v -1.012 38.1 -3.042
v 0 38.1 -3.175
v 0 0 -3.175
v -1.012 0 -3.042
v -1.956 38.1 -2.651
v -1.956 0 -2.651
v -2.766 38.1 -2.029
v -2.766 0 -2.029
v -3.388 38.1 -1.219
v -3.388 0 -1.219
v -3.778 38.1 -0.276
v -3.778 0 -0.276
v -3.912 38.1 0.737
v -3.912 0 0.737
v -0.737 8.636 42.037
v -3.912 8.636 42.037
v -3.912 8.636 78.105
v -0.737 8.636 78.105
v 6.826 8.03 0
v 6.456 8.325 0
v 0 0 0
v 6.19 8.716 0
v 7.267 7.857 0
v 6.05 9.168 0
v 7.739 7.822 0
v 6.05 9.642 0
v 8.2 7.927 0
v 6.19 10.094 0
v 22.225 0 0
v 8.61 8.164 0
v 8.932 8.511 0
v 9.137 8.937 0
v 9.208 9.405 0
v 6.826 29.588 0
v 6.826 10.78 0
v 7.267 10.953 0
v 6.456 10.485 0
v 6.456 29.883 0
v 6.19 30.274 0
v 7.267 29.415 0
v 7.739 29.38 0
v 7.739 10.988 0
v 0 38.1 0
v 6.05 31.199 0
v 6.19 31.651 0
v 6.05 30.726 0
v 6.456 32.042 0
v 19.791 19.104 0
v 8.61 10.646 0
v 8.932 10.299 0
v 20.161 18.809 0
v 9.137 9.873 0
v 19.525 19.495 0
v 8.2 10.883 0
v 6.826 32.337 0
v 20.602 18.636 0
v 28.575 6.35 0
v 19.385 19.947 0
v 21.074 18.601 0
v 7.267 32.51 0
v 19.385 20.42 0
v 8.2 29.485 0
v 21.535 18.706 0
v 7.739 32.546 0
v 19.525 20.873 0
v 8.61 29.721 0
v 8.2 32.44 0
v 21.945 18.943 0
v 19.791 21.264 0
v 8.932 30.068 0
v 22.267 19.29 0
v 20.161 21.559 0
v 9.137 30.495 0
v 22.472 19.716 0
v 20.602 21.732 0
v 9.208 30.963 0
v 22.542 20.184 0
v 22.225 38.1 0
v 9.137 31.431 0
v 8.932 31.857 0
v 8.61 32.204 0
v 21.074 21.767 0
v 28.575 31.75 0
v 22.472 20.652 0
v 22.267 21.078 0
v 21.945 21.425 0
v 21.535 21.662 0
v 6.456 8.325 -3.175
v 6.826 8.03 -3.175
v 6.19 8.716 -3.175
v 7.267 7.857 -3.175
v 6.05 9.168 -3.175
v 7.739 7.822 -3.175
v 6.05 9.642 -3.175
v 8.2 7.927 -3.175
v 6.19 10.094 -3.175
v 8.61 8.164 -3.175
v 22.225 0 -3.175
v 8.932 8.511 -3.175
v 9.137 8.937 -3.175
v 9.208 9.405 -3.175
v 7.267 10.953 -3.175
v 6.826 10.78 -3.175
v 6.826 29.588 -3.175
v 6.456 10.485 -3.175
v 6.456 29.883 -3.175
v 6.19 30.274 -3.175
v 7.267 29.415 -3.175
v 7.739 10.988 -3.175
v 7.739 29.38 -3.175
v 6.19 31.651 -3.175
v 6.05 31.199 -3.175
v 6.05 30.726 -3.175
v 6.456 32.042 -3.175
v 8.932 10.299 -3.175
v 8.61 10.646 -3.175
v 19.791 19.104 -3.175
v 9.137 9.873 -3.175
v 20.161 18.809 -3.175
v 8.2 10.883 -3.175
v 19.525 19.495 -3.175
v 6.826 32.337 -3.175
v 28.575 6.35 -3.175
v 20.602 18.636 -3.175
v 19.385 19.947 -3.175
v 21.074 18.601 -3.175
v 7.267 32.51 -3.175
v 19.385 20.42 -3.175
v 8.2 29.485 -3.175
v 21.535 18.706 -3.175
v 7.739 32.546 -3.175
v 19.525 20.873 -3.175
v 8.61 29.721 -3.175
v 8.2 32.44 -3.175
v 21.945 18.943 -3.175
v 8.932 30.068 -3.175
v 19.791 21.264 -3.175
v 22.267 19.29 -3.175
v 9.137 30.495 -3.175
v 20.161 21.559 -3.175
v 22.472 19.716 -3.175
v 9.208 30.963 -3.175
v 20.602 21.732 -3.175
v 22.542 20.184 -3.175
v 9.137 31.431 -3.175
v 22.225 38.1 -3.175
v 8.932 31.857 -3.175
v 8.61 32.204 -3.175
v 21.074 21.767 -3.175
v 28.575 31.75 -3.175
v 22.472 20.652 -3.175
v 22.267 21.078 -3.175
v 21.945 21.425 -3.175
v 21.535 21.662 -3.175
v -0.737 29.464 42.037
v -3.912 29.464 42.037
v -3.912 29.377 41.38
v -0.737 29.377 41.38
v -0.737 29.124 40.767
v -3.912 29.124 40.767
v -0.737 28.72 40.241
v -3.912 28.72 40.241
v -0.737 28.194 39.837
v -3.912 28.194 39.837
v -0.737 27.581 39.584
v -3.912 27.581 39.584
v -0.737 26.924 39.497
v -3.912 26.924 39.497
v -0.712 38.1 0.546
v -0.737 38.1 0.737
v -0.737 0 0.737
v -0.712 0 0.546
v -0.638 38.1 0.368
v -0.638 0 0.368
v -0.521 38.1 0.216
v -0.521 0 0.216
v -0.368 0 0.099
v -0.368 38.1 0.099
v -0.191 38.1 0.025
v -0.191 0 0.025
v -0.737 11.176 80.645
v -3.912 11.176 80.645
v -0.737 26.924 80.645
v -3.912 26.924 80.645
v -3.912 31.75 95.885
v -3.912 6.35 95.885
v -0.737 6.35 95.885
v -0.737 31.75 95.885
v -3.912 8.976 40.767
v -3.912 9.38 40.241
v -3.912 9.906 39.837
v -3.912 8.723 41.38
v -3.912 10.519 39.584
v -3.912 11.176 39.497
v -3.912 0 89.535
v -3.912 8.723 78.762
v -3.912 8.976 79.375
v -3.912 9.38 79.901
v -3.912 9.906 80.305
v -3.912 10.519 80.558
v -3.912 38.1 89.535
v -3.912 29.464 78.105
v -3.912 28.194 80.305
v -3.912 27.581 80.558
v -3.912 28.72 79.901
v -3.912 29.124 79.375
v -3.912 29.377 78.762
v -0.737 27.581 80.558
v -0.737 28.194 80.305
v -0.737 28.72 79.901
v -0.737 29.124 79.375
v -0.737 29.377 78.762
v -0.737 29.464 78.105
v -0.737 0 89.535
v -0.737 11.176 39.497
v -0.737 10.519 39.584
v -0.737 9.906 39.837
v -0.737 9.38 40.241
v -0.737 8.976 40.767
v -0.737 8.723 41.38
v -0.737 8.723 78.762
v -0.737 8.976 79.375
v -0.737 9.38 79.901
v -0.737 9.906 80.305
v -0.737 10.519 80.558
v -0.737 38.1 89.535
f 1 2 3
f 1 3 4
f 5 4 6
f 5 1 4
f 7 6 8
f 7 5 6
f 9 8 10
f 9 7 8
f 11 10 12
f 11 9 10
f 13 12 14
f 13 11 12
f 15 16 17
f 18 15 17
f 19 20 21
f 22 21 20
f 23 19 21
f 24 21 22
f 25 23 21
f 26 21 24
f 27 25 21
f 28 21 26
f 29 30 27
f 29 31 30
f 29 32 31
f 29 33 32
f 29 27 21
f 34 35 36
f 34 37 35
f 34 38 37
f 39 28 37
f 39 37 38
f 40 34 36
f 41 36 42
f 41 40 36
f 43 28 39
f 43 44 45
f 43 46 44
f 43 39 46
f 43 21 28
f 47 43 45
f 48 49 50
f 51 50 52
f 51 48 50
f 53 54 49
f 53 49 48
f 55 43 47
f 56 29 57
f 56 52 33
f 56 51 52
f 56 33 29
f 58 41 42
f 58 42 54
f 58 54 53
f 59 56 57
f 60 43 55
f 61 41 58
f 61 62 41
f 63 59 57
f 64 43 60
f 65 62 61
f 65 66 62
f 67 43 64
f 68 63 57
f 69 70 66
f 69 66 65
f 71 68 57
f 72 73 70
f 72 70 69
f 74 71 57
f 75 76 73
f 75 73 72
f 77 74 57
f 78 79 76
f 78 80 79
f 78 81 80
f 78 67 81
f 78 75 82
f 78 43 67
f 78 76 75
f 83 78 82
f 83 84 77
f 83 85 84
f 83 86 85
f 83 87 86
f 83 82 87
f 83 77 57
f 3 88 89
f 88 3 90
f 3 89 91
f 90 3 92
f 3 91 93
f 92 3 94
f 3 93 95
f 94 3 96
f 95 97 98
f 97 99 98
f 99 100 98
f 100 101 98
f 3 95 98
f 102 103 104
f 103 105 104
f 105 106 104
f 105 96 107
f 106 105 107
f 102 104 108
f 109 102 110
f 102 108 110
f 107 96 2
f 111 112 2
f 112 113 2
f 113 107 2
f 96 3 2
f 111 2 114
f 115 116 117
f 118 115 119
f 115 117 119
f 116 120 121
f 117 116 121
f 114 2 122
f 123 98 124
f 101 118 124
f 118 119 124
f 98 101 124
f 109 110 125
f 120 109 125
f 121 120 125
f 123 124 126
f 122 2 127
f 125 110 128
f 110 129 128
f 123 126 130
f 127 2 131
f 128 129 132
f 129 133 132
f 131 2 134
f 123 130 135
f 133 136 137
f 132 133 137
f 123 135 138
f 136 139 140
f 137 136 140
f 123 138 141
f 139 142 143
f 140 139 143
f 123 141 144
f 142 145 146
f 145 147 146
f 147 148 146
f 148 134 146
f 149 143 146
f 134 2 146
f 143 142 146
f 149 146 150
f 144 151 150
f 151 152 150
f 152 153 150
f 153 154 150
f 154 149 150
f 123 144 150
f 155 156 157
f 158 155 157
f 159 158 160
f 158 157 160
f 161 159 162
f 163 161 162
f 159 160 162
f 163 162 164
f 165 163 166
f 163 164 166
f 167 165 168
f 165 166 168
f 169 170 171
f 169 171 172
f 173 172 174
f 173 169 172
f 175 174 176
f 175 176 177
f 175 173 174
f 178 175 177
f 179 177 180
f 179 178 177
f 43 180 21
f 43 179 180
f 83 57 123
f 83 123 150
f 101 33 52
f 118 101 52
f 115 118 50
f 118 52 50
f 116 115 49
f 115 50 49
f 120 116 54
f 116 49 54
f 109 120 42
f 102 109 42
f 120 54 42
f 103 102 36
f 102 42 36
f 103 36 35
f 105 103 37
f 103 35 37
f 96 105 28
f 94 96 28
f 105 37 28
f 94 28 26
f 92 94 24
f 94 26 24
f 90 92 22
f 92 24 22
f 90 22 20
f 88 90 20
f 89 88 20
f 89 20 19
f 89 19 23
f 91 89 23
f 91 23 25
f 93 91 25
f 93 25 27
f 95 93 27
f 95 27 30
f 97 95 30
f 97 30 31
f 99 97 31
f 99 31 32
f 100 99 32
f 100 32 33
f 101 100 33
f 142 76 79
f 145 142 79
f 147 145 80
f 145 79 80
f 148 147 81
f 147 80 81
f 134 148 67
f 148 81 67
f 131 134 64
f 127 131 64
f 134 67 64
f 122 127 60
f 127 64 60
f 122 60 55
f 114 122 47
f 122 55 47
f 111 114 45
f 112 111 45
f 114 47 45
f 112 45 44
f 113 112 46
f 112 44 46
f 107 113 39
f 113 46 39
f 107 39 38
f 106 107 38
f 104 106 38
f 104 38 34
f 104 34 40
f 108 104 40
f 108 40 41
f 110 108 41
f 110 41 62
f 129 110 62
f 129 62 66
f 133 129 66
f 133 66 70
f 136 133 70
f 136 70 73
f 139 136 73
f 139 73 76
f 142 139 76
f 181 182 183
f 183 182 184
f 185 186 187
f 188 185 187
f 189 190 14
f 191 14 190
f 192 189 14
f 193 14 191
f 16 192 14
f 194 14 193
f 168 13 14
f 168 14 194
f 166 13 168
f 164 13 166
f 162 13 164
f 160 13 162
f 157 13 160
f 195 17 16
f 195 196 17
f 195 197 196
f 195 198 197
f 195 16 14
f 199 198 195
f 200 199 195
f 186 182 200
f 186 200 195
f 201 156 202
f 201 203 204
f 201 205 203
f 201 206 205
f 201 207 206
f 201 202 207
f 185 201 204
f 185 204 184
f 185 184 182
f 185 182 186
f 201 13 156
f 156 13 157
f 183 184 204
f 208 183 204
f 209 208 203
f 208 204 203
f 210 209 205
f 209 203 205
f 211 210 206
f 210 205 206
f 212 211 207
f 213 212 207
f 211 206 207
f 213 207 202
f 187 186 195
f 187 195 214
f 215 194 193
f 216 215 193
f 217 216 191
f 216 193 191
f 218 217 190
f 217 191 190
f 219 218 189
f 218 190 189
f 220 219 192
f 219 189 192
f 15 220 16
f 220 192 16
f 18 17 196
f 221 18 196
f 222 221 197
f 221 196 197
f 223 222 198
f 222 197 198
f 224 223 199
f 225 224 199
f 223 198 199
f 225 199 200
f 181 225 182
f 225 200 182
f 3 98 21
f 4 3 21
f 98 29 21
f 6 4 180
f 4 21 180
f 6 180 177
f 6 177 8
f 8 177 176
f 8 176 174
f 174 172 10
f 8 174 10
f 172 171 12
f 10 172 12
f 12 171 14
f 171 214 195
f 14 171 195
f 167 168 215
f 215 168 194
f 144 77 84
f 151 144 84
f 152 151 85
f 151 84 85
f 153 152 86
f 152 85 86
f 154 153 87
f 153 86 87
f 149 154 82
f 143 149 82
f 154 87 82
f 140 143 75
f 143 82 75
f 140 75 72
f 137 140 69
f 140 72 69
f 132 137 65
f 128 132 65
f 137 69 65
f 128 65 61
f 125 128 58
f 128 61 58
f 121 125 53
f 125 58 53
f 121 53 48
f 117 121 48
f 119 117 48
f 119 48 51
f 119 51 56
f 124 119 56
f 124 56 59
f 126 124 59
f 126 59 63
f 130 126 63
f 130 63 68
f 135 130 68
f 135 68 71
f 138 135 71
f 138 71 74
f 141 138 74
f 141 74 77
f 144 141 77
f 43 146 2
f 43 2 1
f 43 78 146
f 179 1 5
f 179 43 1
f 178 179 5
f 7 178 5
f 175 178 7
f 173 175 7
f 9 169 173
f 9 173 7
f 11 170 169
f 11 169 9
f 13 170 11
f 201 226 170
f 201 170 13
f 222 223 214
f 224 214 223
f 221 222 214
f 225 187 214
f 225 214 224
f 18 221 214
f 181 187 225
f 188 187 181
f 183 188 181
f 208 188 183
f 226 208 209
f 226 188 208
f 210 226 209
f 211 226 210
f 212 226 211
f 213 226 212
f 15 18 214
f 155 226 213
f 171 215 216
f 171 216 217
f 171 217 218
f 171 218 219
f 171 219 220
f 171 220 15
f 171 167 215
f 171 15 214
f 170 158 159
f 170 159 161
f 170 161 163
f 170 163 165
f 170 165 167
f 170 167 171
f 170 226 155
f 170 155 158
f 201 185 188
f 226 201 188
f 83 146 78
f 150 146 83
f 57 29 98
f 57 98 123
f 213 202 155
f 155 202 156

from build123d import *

# Parameters (mm, degrees)
SKETCH1_W                 = 28.575
SKETCH1_H                 = 38.1
BASE_FLANGE1_DEPTH        = 3.175
EDGE_FLANGE1_DEPTH        = 38.1
BREAK_CORNER1_START       = 42.656216575
BREAK_CORNER1_OUTLINE_W   = 32
BREAK_CORNER1_OUTLINE_H   = 6
BREAK_CORNER1_DEPTH       = 4.490128061
BREAK_CORNER1_START_2     = 15.715448212
BREAK_CORNER1_2_OUTLINE_W = 32
BREAK_CORNER1_2_OUTLINE_H = 6
BREAK_CORNER1_2_DEPTH     = 4.49012806
BREAK_CORNER1_START_3     = 90.251574017
BREAK_CORNER1_3_OUTLINE_W = 6
BREAK_CORNER1_3_OUTLINE_H = 32
BREAK_CORNER1_3_DEPTH     = 4.49012806
BREAK_CORNER1_START_4     = -67.800933714
BREAK_CORNER1_4_OUTLINE_W = 6
BREAK_CORNER1_4_OUTLINE_H = 31
BREAK_CORNER1_4_DEPTH     = 4.49012806
CUT_EXTRUDE1_REACH        = 110.171
CUT_EXTRUDE2_REACH        = 109.061
SKETCH10_R                = 1.5875


# Read off the part's stored shape, not the designer's step: Break-Corner1
# Sheet-metal steps are written as plain solids
with BuildPart() as part:
    # Sketch1 → Base-Flange1 (new body)
    with BuildSketch(Plane.XY):
        with Locations((14.2875, 19.05)):
            Rectangle(SKETCH1_W, SKETCH1_H)
    extrude(amount=-BASE_FLANGE1_DEPTH)

    # Edge-Flange1 section (across the edge) → Edge-Flange1 (add)
    with BuildSketch(Plane(origin=(-0.7366, 38.1, 0), x_dir=(1, 0, 0), z_dir=(0, -1, 0))):
        with BuildLine():
            Line((-3.175, 0.7366), (-3.175, 95.885))
            Line((-3.175, 95.885), (0, 95.885))
            Line((0, 95.885), (0, 0.7366))
            ThreePointArc((0, 0.7366), (0.215745145, 0.215745145), (0.7366, 0))
            Line((0.7366, 0), (0.7366, -3.175))
            ThreePointArc((0.7366, -3.175), (-2.029318885, -2.029318885), (-3.175, 0.7366))
        make_face()
    extrude(amount=EDGE_FLANGE1_DEPTH)

    # Break-Corner1 outline → Break-Corner1 (cut)
    with BuildSketch(Plane(origin=(0, 0, 0), x_dir=(0.707106781186548, -0.707106781186547, 0), z_dir=(0.707106781186547, 0.707106781186548, 0)).offset(BREAK_CORNER1_START)):
        with Locations((3, 2)):
            Rectangle(BREAK_CORNER1_OUTLINE_W, BREAK_CORNER1_OUTLINE_H)
    extrude(amount=BREAK_CORNER1_DEPTH, mode=Mode.SUBTRACT)

    # Break-Corner1 2 outline → Break-Corner1 2 (cut)
    with BuildSketch(Plane(origin=(0, 0, 0), x_dir=(0.707106781186548, 0.707106781186547, 0), z_dir=(0.707106781186547, -0.707106781186548, 0)).offset(BREAK_CORNER1_START_2)):
        with Locations((30, -2)):
            Rectangle(BREAK_CORNER1_2_OUTLINE_W, BREAK_CORNER1_2_OUTLINE_H)
    extrude(amount=BREAK_CORNER1_2_DEPTH, mode=Mode.SUBTRACT)

    # Break-Corner1 3 outline → Break-Corner1 3 (cut)
    with BuildSketch(Plane(origin=(0, 0, 0), x_dir=(1, 0, 0), z_dir=(0, 0.707106781186548, 0.707106781186547)).offset(BREAK_CORNER1_START_3)):
        with Locations((-2, -51)):
            Rectangle(BREAK_CORNER1_3_OUTLINE_W, BREAK_CORNER1_3_OUTLINE_H)
    extrude(amount=BREAK_CORNER1_3_DEPTH, mode=Mode.SUBTRACT)

    # Break-Corner1 4 outline → Break-Corner1 4 (cut)
    with BuildSketch(Plane(origin=(0, 0, 0), x_dir=(1, 0, 0), z_dir=(0, 0.707106781186548, -0.707106781186547)).offset(BREAK_CORNER1_START_4)):
        with Locations((-2, -77.5)):
            Rectangle(BREAK_CORNER1_4_OUTLINE_W, BREAK_CORNER1_4_OUTLINE_H)
    extrude(amount=BREAK_CORNER1_4_DEPTH, mode=Mode.SUBTRACT)

    # Sketch9 → Cut-Extrude1 (cut, up to next)
    with BuildSketch(Plane.ZY.offset(3.9116), mode=Mode.PRIVATE) as cut_extrude1_sk1:
        with BuildLine():
            Line((42.037, 8.636), (78.105, 8.636))
            ThreePointArc((78.105, 8.636), (79.901051224, 9.379948776), (80.645, 11.176))
            Line((80.645, 11.176), (80.645, 26.924))
            ThreePointArc((80.645, 26.924), (79.901051224, 28.720051224), (78.105, 29.464))
            Line((78.105, 29.464), (42.037, 29.464))
            ThreePointArc((42.037, 29.464), (40.240948776, 28.720051224), (39.497, 26.924))
            Line((39.497, 26.924), (39.497, 11.176))
            ThreePointArc((39.497, 11.176), (40.240948776, 9.379948776), (42.037, 8.636))
        make_face()
    cut_extrude1_tool1 = extrude(cut_extrude1_sk1.sketch, amount=-CUT_EXTRUDE1_REACH, mode=Mode.PRIVATE) & part.part
    add(cut_extrude1_tool1.solids().sort_by_distance((-3.9116, 19.05, 60.071))[0], mode=Mode.SUBTRACT)

    # Sketch10 → Cut-Extrude2 (cut, up to next)
    with BuildSketch(Plane.XY, mode=Mode.PRIVATE) as cut_extrude2_sk1:
        with Locations((7.62, 30.96264399)):
            Circle(SKETCH10_R)
    cut_extrude2_tool1 = extrude(cut_extrude2_sk1.sketch, amount=-CUT_EXTRUDE2_REACH, mode=Mode.PRIVATE) & part.part
    # Sketch10 → Cut-Extrude2 (cut, up to next)
    with BuildSketch(Plane.XY, mode=Mode.PRIVATE) as cut_extrude2_sk2:
        with Locations((20.955, 20.183863844)):
            Circle(SKETCH10_R)
    cut_extrude2_tool2 = extrude(cut_extrude2_sk2.sketch, amount=-CUT_EXTRUDE2_REACH, mode=Mode.PRIVATE) & part.part
    # Sketch10 → Cut-Extrude2 (cut, up to next)
    with BuildSketch(Plane.XY, mode=Mode.PRIVATE) as cut_extrude2_sk3:
        with Locations((7.62, 9.405083697)):
            Circle(SKETCH10_R)
    cut_extrude2_tool3 = extrude(cut_extrude2_sk3.sketch, amount=-CUT_EXTRUDE2_REACH, mode=Mode.PRIVATE) & part.part
    add(cut_extrude2_tool1.solids().sort_by_distance((7.62, 30.962644, 0))[0], mode=Mode.SUBTRACT)
    add(cut_extrude2_tool2.solids().sort_by_distance((20.955, 20.183864, 0))[0], mode=Mode.SUBTRACT)
    add(cut_extrude2_tool3.solids().sort_by_distance((7.62, 9.405084, 0))[0], mode=Mode.SUBTRACT)


solid = part.part
